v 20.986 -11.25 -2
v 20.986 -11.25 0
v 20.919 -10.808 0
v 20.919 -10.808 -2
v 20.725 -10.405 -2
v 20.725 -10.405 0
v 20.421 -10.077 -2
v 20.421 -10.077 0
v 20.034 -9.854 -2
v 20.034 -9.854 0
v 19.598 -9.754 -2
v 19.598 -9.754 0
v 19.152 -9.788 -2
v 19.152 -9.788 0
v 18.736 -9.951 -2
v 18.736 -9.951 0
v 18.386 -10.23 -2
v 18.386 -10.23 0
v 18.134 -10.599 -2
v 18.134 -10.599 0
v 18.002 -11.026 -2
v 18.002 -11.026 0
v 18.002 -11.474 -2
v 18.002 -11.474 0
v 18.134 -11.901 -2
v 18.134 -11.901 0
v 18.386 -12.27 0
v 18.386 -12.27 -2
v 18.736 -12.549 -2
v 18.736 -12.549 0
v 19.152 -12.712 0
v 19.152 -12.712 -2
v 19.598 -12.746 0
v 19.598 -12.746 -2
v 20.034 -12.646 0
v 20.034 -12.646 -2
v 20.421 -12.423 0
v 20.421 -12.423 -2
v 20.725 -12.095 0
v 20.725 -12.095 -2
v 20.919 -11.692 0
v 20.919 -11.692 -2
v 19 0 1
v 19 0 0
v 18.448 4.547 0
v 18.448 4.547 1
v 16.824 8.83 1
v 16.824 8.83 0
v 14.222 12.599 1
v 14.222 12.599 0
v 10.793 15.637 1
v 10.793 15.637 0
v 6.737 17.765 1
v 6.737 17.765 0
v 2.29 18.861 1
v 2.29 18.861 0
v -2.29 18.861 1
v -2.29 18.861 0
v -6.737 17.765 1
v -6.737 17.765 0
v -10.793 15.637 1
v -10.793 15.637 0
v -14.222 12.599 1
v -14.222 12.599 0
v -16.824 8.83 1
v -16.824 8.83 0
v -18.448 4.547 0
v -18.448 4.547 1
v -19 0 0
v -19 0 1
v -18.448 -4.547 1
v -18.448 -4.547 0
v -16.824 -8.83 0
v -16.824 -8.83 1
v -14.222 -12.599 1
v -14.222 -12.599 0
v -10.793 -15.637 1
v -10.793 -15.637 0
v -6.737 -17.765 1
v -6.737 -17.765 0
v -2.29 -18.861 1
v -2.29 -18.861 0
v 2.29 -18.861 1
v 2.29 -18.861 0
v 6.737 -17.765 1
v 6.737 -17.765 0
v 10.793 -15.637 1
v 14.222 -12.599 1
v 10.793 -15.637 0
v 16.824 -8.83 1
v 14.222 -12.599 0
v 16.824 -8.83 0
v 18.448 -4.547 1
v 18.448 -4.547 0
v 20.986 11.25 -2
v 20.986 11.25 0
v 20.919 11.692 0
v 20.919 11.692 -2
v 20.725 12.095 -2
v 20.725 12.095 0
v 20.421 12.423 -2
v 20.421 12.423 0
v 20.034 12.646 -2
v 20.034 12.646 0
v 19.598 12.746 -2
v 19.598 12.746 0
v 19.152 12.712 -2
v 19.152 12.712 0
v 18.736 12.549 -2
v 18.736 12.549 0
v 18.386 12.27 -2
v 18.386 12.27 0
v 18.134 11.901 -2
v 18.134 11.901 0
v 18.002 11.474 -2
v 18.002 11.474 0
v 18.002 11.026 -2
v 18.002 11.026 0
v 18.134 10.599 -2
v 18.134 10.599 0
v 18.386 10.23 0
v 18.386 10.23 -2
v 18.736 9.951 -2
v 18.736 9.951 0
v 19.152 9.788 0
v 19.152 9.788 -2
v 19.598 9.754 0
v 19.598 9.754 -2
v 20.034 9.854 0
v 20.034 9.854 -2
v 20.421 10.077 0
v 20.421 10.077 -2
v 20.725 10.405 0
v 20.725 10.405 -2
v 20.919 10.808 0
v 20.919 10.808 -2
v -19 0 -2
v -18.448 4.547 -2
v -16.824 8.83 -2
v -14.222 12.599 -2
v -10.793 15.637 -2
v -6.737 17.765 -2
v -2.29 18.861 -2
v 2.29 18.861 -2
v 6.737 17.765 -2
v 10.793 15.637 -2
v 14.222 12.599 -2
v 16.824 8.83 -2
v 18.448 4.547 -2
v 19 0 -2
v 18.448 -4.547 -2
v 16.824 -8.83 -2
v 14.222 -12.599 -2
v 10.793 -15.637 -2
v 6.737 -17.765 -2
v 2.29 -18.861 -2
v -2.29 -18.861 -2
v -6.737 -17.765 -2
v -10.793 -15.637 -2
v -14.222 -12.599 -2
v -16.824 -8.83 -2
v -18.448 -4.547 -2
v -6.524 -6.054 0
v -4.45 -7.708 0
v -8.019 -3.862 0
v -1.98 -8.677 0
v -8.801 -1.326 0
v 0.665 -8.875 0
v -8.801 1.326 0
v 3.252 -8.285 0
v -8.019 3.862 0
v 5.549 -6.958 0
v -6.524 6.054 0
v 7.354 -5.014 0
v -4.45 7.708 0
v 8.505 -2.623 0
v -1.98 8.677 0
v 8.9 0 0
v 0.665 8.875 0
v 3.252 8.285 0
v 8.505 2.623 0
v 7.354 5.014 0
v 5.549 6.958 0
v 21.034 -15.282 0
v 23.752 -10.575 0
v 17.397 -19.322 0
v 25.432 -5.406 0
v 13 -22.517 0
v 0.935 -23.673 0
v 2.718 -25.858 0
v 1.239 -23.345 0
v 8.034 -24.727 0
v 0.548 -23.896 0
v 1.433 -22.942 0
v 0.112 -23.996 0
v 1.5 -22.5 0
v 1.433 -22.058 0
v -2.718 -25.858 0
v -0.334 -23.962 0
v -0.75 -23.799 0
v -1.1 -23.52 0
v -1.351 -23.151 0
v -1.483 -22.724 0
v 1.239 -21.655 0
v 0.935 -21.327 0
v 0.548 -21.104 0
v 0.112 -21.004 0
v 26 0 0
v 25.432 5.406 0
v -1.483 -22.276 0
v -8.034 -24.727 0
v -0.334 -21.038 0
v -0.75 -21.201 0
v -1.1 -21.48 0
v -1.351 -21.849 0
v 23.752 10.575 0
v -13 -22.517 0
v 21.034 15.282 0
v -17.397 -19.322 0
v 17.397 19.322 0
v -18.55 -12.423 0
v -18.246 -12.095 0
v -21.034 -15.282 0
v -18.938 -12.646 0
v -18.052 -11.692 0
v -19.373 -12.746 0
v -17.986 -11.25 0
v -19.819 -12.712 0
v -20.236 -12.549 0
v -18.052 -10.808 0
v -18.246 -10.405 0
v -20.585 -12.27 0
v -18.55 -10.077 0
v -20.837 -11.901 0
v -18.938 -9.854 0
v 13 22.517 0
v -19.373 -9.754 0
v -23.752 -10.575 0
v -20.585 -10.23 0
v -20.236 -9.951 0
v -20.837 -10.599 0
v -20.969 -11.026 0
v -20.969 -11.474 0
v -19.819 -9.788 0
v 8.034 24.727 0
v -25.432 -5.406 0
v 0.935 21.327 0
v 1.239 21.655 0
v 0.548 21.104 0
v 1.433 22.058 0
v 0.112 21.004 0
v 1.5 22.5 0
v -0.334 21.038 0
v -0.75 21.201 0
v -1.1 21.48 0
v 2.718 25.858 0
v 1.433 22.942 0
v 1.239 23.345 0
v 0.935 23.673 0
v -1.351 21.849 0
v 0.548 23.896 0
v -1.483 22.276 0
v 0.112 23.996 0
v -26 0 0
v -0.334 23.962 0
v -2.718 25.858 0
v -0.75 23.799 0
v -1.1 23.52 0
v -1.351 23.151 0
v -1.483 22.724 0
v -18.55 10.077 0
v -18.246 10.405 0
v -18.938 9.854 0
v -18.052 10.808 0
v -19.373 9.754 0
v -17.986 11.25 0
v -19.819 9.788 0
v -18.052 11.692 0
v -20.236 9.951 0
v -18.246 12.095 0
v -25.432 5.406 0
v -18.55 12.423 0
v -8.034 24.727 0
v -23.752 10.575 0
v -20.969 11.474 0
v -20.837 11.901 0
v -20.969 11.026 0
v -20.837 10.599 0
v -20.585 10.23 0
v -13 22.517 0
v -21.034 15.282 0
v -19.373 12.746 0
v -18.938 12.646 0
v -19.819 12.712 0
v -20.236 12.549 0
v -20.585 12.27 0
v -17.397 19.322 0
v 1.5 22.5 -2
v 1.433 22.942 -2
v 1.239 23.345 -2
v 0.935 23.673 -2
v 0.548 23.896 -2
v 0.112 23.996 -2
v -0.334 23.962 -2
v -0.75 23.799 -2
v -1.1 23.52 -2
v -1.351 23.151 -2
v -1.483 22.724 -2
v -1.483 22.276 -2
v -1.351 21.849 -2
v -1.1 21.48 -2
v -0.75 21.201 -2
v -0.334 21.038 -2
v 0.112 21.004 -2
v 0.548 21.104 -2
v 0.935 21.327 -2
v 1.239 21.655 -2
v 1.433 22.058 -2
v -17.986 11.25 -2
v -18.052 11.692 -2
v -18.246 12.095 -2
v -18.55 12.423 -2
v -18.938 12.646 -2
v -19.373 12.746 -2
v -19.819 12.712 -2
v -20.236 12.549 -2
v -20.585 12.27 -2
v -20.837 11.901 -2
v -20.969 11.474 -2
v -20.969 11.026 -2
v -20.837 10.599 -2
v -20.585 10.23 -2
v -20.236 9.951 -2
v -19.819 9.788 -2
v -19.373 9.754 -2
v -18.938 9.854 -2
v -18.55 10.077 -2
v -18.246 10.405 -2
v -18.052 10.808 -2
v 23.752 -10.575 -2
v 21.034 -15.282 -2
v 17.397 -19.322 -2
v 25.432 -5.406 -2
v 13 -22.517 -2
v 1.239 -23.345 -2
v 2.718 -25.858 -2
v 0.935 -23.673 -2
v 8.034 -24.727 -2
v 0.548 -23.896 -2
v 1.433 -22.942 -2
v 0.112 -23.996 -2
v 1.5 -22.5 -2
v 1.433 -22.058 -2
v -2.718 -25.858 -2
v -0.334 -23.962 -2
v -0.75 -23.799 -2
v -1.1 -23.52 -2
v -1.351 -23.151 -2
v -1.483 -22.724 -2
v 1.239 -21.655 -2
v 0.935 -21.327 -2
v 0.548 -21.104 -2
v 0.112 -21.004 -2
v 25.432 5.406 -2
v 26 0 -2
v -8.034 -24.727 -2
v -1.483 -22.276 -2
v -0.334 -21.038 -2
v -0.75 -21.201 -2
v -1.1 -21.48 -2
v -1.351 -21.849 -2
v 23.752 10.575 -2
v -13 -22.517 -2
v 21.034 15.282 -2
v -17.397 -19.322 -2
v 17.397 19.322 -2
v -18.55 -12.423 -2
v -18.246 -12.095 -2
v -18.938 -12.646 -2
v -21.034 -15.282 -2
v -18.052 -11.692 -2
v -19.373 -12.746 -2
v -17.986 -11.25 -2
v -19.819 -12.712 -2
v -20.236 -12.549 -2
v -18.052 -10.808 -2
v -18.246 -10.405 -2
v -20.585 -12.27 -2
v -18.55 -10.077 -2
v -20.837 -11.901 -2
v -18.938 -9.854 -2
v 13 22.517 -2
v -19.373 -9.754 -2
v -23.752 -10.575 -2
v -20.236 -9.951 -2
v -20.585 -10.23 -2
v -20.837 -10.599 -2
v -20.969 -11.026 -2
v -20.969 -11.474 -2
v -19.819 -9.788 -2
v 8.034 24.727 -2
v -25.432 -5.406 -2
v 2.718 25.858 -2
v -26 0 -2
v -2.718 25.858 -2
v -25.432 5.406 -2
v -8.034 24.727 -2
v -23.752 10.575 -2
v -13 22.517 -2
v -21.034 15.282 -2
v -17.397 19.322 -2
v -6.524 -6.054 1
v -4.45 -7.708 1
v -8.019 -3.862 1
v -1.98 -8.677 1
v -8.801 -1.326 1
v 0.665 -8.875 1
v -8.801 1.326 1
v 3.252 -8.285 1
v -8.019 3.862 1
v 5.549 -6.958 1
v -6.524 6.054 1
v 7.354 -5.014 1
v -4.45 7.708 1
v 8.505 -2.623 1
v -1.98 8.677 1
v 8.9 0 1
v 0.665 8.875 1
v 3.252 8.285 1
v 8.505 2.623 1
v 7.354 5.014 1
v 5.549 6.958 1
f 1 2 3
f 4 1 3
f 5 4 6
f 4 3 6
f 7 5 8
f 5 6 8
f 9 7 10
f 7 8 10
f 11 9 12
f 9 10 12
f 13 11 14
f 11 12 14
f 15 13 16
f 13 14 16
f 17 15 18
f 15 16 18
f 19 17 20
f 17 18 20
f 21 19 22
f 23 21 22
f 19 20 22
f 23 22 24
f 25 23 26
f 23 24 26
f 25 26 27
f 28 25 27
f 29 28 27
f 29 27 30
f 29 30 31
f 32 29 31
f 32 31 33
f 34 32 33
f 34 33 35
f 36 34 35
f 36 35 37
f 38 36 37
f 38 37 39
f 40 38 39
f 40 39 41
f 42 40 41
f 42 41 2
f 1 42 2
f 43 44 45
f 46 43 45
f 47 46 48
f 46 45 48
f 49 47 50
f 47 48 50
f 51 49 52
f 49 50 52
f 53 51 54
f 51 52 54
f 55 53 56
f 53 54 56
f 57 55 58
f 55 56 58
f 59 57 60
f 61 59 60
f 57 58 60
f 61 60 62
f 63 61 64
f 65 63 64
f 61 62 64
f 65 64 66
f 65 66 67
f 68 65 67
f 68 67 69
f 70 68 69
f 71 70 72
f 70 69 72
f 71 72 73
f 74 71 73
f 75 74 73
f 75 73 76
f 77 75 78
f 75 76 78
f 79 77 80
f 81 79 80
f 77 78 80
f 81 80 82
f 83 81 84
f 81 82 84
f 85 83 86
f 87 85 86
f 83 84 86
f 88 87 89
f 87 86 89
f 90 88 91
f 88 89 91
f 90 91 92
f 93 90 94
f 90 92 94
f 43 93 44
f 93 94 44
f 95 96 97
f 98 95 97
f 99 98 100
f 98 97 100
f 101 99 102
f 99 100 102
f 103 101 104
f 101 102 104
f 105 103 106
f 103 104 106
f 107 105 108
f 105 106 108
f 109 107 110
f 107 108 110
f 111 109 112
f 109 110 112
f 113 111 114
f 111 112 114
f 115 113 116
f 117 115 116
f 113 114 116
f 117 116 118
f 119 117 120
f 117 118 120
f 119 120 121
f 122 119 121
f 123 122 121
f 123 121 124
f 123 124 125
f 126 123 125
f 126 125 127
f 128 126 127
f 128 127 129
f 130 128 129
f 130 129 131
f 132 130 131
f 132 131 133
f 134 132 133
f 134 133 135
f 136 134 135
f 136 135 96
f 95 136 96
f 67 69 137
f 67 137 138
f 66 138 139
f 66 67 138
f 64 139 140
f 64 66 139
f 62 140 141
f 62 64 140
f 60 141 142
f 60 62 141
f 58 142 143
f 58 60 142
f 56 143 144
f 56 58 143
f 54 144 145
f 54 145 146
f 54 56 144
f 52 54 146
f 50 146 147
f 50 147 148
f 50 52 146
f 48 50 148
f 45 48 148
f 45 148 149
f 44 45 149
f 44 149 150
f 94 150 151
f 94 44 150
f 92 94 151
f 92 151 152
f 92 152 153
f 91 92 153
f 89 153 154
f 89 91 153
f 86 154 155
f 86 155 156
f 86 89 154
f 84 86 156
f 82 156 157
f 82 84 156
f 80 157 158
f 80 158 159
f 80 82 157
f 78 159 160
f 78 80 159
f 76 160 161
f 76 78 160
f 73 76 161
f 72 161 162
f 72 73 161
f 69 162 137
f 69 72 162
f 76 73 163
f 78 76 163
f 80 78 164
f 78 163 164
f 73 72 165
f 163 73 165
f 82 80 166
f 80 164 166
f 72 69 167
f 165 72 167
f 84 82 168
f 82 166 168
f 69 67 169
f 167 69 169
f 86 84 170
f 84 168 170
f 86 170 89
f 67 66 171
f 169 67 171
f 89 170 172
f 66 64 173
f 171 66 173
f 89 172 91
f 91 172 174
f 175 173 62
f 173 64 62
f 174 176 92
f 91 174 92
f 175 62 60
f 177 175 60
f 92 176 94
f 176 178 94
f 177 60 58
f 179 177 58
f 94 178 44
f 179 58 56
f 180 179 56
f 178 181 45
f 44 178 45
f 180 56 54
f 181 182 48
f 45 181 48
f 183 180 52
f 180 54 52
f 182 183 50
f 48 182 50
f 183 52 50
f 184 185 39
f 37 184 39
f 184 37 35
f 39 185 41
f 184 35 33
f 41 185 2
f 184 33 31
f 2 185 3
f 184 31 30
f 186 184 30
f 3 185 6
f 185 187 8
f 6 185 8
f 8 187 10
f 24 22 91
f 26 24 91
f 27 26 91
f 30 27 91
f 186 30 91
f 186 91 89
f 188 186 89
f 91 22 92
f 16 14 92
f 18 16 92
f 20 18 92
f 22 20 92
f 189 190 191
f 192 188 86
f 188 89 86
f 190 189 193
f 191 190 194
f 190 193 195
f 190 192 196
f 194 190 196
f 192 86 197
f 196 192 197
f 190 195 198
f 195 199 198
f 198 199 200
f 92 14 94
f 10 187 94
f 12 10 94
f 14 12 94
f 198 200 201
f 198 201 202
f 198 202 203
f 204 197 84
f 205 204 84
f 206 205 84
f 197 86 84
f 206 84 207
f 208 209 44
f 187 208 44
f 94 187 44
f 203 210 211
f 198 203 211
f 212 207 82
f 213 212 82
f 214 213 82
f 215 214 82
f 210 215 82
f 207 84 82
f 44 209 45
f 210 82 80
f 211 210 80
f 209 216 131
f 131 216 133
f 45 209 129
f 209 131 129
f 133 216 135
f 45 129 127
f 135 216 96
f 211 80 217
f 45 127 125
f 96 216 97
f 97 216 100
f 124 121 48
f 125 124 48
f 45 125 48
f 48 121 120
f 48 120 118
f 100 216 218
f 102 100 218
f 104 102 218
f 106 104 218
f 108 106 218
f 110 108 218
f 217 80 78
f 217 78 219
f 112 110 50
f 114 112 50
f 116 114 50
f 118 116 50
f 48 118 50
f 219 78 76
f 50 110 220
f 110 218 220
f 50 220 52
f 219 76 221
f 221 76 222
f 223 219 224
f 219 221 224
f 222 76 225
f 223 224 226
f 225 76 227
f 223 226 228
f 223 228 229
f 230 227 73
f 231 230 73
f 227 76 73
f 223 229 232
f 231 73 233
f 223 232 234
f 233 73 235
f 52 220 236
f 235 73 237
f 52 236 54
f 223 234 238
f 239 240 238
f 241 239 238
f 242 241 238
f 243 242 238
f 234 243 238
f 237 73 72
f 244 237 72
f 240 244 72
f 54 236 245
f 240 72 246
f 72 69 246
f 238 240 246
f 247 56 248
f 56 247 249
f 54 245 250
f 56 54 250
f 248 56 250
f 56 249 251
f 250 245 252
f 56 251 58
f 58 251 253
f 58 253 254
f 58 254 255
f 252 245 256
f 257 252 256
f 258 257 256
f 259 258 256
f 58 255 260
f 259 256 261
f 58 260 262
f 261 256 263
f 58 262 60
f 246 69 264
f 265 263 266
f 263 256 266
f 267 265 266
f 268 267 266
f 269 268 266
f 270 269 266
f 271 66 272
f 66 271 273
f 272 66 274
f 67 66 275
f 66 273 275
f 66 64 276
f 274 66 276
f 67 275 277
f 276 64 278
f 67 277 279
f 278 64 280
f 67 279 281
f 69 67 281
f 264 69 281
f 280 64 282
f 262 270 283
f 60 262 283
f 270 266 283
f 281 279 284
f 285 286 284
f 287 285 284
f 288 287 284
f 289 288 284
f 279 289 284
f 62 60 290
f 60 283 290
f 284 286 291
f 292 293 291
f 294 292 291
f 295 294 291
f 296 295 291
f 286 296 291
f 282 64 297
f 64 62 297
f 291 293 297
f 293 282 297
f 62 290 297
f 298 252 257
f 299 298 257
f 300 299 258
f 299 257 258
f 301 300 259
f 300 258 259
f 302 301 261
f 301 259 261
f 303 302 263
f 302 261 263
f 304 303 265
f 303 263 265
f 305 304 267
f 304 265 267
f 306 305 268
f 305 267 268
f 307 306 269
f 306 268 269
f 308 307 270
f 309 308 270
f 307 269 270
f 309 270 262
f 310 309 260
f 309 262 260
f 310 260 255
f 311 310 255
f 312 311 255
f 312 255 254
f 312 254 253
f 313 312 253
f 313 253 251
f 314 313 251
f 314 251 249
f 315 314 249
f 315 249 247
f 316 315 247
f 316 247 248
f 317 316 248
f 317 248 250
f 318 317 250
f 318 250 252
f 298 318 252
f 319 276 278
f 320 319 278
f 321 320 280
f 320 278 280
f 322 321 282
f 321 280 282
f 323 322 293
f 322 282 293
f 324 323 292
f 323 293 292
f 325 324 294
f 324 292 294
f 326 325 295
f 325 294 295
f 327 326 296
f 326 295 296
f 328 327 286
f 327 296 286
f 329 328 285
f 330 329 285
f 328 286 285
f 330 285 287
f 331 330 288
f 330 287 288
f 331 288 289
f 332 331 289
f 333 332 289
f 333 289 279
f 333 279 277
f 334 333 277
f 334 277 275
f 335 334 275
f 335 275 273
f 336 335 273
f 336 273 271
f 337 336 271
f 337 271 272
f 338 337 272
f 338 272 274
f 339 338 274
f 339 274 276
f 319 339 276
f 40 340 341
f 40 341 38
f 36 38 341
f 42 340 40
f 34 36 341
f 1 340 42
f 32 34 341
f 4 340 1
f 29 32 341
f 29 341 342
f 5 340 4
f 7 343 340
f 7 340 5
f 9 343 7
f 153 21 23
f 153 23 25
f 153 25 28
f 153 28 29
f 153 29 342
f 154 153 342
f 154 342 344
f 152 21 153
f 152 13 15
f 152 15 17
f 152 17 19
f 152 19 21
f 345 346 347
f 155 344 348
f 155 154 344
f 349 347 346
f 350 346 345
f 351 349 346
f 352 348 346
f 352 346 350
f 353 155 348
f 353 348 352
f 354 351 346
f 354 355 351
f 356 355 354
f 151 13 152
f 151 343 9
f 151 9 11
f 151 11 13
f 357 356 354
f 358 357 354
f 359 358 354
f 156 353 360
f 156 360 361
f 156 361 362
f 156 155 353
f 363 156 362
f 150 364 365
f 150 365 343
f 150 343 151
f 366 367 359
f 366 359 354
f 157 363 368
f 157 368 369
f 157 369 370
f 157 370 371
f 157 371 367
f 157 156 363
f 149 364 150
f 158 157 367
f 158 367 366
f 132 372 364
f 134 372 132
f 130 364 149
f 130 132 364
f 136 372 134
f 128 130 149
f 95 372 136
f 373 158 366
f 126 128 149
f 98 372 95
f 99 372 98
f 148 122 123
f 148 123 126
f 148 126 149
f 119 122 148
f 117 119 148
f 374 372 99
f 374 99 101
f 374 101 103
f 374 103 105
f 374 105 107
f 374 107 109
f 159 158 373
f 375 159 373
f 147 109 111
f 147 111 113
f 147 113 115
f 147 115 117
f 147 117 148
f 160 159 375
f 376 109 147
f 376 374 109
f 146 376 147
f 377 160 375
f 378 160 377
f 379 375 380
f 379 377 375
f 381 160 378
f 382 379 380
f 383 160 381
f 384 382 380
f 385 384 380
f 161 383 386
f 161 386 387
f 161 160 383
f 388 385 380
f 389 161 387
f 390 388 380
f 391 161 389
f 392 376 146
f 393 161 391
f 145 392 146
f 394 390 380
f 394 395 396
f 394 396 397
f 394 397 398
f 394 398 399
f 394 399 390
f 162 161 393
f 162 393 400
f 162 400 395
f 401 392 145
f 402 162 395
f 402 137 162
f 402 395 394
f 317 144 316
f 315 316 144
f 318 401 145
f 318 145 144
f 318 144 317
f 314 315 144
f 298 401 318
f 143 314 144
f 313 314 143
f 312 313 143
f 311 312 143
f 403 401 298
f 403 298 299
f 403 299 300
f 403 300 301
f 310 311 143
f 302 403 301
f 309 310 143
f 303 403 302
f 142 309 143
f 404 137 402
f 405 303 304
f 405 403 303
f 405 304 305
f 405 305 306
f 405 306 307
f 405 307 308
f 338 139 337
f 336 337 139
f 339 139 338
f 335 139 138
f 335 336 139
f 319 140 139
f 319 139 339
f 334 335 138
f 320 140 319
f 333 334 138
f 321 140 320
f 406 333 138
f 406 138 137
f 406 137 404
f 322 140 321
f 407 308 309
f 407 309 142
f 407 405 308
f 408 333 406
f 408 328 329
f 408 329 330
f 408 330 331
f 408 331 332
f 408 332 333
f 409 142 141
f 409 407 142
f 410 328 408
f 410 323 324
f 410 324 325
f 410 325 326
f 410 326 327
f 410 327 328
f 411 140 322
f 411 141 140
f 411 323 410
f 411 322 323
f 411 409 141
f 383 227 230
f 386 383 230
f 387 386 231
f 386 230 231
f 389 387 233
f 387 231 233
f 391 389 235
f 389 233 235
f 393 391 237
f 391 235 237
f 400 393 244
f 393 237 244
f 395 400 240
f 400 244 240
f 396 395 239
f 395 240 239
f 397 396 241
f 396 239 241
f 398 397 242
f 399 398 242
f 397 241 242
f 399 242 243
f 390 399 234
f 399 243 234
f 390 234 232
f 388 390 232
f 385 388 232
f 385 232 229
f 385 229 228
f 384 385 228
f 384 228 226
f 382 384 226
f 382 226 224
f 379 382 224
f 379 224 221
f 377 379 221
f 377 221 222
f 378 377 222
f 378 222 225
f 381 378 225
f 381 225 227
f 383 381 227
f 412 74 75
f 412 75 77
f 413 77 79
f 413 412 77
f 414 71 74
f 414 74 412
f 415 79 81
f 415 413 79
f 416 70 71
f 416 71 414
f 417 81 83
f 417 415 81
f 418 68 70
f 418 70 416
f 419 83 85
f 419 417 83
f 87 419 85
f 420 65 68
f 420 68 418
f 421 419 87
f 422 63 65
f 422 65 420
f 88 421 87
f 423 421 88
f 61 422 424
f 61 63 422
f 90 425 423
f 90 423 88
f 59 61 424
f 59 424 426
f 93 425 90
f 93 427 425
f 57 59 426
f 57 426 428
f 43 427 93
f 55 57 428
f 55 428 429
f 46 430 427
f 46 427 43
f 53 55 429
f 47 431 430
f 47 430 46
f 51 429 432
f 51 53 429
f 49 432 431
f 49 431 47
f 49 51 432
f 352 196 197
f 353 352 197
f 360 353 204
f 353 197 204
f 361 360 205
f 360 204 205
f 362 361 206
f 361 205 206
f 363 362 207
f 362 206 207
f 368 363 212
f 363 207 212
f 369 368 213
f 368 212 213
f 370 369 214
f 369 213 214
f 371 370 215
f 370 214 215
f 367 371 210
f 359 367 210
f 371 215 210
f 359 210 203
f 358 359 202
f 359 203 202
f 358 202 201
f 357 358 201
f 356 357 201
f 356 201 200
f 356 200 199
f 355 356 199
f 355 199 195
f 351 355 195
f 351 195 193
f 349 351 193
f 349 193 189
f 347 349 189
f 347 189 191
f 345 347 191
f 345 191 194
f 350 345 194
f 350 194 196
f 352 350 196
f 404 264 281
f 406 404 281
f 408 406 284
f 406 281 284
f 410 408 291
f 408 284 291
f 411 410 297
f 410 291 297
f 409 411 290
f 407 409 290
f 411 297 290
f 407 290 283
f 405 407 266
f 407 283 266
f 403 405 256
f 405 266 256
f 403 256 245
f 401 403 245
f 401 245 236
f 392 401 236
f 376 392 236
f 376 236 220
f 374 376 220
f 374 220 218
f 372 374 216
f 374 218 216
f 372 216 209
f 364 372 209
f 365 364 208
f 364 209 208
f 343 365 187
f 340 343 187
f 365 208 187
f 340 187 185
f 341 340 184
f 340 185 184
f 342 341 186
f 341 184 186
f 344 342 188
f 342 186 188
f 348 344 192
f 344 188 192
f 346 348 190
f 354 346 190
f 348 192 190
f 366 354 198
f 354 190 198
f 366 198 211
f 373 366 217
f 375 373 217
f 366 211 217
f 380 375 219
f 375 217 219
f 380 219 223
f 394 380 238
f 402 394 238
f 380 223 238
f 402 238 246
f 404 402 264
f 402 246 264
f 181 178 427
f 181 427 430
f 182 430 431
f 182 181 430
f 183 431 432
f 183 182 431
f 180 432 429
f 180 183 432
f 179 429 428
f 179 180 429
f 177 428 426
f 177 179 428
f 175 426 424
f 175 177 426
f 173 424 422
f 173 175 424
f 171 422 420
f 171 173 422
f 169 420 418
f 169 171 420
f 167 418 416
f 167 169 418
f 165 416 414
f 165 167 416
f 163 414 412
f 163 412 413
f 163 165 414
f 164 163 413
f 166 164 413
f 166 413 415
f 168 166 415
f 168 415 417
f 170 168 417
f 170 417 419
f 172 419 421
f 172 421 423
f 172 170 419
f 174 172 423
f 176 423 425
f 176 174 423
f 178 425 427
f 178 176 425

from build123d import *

# Parameters (mm, degrees)
CROQUIS1_R              = 19
CROQUIS1_R_2            = 8.9
SALIENTE_EXTRUIR1_DEPTH = 1
CROQUIS2_R              = 26
CROQUIS2_R_2            = 19
SALIENTE_EXTRUIR2_DEPTH = 2
CROQUIS3_R              = 1.5
CORTAR_EXTRUIR1_DEPTH   = 3


with BuildPart() as part:
    # Croquis1 → Saliente-Extruir1 (new body)
    with BuildSketch(Plane.XY):
        Circle(CROQUIS1_R)
        Circle(CROQUIS1_R_2, mode=Mode.SUBTRACT)
    extrude(amount=SALIENTE_EXTRUIR1_DEPTH)


with BuildPart() as body_2:
    # Croquis2 → Saliente-Extruir2 (new body)
    with BuildSketch(Plane(origin=(0, 0, 0), x_dir=(-1, 0, 0), z_dir=(0, 0, -1))):
        Circle(CROQUIS2_R)
        Circle(CROQUIS2_R_2, mode=Mode.SUBTRACT)
    extrude(amount=SALIENTE_EXTRUIR2_DEPTH)

    # Croquis3 → Cortar-Extruir1 (cut)
    with BuildSketch(Plane.XY):
        with Locations((0, 22.5)):
            Circle(CROQUIS3_R)
        with Locations((19.485571585, 11.25)):
            Circle(CROQUIS3_R)
        with Locations((19.485571585, -11.25)):
            Circle(CROQUIS3_R)
        with Locations((0, -22.5)):
            Circle(CROQUIS3_R)
        with Locations((-19.485571585, -11.25)):
            Circle(CROQUIS3_R)
        with Locations((-19.485571585, 11.25)):
            Circle(CROQUIS3_R)
    extrude(amount=-CORTAR_EXTRUIR1_DEPTH, mode=Mode.SUBTRACT)


solid = Compound([part.part, body_2.part])
